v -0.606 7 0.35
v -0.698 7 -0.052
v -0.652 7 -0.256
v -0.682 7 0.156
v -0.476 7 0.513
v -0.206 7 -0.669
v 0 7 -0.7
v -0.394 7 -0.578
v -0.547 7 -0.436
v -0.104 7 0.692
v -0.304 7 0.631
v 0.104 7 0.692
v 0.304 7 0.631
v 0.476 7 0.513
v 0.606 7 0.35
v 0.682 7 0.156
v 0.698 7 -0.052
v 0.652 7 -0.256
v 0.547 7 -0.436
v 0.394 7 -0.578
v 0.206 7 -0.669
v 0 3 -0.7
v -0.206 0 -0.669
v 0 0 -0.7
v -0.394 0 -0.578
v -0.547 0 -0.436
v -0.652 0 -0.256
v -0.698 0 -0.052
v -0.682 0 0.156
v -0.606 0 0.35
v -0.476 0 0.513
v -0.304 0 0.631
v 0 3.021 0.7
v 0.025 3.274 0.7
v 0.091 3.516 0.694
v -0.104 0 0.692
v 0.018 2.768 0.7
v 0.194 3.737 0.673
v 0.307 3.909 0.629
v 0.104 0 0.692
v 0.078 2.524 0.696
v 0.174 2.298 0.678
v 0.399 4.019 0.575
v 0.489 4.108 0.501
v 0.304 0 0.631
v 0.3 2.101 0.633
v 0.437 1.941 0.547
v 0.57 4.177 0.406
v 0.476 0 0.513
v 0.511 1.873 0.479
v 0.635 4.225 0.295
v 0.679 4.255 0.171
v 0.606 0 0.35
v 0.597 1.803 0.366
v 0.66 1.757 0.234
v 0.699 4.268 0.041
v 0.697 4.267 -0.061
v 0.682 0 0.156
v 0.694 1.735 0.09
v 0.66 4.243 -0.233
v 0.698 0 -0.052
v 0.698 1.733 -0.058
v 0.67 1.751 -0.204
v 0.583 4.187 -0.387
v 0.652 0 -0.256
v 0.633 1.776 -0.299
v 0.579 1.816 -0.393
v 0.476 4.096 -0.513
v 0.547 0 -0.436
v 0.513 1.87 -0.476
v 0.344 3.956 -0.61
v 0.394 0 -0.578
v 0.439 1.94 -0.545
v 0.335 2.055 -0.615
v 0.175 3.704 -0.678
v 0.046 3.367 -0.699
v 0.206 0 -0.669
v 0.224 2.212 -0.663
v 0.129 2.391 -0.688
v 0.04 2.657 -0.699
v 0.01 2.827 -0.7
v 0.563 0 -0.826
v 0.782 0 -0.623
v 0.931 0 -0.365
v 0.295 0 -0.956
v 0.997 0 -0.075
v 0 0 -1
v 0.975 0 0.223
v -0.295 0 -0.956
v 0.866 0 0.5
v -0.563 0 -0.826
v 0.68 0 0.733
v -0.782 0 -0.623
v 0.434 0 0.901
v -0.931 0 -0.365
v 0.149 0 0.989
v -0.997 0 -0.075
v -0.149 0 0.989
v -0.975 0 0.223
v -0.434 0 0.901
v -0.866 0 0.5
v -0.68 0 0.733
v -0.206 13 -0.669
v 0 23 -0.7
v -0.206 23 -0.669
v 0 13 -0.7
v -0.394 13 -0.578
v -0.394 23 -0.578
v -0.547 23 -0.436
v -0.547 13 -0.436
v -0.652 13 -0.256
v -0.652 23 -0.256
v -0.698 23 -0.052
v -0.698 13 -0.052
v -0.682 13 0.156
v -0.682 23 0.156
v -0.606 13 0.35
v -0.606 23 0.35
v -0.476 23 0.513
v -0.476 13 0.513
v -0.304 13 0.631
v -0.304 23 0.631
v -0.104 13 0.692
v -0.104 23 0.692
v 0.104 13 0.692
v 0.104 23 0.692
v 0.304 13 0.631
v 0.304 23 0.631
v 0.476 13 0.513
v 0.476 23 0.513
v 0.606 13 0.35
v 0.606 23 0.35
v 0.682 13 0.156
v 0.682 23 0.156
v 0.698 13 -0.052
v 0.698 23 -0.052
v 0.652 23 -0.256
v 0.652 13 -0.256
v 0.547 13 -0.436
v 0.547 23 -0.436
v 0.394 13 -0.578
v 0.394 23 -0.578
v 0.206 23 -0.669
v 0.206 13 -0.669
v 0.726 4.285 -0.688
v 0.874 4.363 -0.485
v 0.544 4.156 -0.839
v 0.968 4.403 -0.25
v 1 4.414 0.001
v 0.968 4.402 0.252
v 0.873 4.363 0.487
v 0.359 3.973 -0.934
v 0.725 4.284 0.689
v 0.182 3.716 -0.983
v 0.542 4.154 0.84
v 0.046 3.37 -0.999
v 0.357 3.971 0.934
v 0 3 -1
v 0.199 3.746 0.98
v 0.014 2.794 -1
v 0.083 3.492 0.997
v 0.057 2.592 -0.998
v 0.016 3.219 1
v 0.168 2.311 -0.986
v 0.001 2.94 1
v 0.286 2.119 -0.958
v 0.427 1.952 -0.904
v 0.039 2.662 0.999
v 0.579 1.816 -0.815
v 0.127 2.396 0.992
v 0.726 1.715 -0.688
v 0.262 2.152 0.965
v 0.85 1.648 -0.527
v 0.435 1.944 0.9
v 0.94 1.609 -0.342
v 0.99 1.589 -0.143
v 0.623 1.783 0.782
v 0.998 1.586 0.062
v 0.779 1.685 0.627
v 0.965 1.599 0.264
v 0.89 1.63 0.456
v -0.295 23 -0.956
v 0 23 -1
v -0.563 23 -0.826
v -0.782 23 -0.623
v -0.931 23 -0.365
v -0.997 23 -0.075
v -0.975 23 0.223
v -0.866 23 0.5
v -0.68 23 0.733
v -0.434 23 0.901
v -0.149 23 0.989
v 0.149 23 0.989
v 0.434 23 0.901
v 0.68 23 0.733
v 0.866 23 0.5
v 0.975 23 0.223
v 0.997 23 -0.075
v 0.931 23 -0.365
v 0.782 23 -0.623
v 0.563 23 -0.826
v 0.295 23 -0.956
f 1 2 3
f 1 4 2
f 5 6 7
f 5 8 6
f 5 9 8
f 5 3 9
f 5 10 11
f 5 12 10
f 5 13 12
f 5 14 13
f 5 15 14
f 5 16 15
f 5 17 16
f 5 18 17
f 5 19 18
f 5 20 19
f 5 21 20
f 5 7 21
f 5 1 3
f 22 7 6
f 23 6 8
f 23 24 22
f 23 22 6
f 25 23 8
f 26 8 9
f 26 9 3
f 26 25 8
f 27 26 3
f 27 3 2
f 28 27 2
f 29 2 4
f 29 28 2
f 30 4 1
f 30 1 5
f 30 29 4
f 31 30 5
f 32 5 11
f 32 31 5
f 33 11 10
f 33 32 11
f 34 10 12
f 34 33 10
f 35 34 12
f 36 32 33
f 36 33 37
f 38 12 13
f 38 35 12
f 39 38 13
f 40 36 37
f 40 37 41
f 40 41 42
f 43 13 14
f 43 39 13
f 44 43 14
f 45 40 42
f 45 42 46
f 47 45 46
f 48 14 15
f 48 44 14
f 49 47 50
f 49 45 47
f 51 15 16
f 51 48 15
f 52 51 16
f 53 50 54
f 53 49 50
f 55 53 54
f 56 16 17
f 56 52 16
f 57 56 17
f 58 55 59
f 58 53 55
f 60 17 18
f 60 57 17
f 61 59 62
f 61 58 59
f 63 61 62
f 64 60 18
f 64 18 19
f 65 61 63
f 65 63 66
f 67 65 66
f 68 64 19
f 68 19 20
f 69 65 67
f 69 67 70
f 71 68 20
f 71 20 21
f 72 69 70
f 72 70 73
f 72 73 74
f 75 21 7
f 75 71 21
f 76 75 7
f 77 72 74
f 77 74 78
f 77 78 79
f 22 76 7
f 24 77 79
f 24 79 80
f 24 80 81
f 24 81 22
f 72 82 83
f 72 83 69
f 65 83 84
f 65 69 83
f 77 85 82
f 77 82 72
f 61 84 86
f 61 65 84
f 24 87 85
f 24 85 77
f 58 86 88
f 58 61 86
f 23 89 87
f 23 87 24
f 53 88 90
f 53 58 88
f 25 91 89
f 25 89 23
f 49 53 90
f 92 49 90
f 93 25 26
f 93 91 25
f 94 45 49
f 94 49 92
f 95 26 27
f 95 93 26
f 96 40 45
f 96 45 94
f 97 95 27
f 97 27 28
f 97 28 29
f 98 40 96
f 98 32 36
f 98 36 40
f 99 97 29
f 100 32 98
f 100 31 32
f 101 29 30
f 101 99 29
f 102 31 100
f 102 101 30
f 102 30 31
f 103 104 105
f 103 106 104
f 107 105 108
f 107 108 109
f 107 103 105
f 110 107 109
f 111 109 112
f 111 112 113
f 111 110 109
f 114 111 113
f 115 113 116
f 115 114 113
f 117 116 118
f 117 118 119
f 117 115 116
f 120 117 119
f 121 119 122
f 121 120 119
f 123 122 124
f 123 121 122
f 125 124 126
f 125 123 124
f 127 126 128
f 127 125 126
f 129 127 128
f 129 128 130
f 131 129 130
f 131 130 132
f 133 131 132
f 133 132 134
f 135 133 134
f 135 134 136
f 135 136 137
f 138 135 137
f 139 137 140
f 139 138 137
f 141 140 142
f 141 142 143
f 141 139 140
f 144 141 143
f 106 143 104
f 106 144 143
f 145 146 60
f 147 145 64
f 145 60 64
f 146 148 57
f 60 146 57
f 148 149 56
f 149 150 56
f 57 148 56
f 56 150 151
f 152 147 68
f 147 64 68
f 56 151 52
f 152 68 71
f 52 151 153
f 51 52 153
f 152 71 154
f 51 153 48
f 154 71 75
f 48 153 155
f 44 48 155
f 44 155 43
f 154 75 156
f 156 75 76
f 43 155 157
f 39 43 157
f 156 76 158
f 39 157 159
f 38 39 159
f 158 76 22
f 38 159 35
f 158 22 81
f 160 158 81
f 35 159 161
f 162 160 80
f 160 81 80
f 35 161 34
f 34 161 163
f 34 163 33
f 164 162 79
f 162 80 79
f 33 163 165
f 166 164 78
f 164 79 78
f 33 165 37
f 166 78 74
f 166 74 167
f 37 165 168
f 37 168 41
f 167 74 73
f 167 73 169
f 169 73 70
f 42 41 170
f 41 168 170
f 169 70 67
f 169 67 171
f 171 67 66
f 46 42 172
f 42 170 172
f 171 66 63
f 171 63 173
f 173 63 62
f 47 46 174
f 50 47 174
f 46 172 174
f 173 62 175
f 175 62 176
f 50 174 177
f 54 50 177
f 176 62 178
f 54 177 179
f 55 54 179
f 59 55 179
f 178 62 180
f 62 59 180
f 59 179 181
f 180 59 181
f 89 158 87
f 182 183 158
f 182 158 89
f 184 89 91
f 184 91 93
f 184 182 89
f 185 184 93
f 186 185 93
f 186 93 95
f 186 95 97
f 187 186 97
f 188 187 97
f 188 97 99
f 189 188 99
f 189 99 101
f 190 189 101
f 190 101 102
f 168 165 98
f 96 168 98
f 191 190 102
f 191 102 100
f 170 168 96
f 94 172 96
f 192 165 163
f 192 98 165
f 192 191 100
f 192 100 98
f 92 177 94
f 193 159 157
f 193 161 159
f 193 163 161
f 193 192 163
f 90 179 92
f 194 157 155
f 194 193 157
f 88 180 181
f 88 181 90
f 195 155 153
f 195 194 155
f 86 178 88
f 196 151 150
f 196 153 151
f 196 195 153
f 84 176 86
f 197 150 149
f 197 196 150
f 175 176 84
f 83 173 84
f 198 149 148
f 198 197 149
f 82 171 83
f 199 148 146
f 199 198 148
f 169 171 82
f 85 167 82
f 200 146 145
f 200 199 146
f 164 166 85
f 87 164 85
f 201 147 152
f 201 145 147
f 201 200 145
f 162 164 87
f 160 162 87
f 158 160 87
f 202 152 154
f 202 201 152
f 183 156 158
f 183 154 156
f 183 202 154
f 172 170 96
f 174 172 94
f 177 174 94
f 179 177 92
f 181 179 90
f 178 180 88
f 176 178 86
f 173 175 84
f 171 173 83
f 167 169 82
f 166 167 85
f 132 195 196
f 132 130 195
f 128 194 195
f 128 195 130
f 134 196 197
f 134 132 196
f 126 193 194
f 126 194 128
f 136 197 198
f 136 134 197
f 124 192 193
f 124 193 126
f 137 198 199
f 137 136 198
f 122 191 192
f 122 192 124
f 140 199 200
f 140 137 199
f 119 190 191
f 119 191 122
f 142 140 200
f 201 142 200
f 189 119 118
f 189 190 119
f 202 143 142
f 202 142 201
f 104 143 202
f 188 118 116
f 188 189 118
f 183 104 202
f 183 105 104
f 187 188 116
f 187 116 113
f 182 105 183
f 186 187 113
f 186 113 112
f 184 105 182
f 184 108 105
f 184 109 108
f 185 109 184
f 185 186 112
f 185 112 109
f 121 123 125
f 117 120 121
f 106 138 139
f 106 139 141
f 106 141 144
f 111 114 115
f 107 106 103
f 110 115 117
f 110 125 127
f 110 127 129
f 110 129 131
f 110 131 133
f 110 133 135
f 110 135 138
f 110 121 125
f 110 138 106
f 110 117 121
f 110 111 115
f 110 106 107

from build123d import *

# Parameters (mm, degrees)
SKETCH_2_R          = 1.5
CUT_EXTRUDE_1_DEPTH = 5


with BuildPart() as part:
    # Эскиз1 → Повернуть1 (revolve)
    with BuildSketch(Plane(origin=(0, 0, 0), x_dir=(0, 0, -1), z_dir=(1, 0, 0))):
        Polygon((0.7, 13), (0, 13), (0, 7), (0.7, 7), (0.7, 0), (1, 0), (1, 23), (0.7, 23), align=None)
    revolve(axis=Axis((0, 0, 0), (0, 1, 0)))

    # Эскиз2 → Вырез-Вытянуть1 (cut, symmetric)
    with BuildSketch(Plane.XY):
        with Locations((1.5, 3)):
            Circle(SKETCH_2_R)
    extrude(amount=CUT_EXTRUDE_1_DEPTH, both=True, mode=Mode.SUBTRACT)


solid = part.part
